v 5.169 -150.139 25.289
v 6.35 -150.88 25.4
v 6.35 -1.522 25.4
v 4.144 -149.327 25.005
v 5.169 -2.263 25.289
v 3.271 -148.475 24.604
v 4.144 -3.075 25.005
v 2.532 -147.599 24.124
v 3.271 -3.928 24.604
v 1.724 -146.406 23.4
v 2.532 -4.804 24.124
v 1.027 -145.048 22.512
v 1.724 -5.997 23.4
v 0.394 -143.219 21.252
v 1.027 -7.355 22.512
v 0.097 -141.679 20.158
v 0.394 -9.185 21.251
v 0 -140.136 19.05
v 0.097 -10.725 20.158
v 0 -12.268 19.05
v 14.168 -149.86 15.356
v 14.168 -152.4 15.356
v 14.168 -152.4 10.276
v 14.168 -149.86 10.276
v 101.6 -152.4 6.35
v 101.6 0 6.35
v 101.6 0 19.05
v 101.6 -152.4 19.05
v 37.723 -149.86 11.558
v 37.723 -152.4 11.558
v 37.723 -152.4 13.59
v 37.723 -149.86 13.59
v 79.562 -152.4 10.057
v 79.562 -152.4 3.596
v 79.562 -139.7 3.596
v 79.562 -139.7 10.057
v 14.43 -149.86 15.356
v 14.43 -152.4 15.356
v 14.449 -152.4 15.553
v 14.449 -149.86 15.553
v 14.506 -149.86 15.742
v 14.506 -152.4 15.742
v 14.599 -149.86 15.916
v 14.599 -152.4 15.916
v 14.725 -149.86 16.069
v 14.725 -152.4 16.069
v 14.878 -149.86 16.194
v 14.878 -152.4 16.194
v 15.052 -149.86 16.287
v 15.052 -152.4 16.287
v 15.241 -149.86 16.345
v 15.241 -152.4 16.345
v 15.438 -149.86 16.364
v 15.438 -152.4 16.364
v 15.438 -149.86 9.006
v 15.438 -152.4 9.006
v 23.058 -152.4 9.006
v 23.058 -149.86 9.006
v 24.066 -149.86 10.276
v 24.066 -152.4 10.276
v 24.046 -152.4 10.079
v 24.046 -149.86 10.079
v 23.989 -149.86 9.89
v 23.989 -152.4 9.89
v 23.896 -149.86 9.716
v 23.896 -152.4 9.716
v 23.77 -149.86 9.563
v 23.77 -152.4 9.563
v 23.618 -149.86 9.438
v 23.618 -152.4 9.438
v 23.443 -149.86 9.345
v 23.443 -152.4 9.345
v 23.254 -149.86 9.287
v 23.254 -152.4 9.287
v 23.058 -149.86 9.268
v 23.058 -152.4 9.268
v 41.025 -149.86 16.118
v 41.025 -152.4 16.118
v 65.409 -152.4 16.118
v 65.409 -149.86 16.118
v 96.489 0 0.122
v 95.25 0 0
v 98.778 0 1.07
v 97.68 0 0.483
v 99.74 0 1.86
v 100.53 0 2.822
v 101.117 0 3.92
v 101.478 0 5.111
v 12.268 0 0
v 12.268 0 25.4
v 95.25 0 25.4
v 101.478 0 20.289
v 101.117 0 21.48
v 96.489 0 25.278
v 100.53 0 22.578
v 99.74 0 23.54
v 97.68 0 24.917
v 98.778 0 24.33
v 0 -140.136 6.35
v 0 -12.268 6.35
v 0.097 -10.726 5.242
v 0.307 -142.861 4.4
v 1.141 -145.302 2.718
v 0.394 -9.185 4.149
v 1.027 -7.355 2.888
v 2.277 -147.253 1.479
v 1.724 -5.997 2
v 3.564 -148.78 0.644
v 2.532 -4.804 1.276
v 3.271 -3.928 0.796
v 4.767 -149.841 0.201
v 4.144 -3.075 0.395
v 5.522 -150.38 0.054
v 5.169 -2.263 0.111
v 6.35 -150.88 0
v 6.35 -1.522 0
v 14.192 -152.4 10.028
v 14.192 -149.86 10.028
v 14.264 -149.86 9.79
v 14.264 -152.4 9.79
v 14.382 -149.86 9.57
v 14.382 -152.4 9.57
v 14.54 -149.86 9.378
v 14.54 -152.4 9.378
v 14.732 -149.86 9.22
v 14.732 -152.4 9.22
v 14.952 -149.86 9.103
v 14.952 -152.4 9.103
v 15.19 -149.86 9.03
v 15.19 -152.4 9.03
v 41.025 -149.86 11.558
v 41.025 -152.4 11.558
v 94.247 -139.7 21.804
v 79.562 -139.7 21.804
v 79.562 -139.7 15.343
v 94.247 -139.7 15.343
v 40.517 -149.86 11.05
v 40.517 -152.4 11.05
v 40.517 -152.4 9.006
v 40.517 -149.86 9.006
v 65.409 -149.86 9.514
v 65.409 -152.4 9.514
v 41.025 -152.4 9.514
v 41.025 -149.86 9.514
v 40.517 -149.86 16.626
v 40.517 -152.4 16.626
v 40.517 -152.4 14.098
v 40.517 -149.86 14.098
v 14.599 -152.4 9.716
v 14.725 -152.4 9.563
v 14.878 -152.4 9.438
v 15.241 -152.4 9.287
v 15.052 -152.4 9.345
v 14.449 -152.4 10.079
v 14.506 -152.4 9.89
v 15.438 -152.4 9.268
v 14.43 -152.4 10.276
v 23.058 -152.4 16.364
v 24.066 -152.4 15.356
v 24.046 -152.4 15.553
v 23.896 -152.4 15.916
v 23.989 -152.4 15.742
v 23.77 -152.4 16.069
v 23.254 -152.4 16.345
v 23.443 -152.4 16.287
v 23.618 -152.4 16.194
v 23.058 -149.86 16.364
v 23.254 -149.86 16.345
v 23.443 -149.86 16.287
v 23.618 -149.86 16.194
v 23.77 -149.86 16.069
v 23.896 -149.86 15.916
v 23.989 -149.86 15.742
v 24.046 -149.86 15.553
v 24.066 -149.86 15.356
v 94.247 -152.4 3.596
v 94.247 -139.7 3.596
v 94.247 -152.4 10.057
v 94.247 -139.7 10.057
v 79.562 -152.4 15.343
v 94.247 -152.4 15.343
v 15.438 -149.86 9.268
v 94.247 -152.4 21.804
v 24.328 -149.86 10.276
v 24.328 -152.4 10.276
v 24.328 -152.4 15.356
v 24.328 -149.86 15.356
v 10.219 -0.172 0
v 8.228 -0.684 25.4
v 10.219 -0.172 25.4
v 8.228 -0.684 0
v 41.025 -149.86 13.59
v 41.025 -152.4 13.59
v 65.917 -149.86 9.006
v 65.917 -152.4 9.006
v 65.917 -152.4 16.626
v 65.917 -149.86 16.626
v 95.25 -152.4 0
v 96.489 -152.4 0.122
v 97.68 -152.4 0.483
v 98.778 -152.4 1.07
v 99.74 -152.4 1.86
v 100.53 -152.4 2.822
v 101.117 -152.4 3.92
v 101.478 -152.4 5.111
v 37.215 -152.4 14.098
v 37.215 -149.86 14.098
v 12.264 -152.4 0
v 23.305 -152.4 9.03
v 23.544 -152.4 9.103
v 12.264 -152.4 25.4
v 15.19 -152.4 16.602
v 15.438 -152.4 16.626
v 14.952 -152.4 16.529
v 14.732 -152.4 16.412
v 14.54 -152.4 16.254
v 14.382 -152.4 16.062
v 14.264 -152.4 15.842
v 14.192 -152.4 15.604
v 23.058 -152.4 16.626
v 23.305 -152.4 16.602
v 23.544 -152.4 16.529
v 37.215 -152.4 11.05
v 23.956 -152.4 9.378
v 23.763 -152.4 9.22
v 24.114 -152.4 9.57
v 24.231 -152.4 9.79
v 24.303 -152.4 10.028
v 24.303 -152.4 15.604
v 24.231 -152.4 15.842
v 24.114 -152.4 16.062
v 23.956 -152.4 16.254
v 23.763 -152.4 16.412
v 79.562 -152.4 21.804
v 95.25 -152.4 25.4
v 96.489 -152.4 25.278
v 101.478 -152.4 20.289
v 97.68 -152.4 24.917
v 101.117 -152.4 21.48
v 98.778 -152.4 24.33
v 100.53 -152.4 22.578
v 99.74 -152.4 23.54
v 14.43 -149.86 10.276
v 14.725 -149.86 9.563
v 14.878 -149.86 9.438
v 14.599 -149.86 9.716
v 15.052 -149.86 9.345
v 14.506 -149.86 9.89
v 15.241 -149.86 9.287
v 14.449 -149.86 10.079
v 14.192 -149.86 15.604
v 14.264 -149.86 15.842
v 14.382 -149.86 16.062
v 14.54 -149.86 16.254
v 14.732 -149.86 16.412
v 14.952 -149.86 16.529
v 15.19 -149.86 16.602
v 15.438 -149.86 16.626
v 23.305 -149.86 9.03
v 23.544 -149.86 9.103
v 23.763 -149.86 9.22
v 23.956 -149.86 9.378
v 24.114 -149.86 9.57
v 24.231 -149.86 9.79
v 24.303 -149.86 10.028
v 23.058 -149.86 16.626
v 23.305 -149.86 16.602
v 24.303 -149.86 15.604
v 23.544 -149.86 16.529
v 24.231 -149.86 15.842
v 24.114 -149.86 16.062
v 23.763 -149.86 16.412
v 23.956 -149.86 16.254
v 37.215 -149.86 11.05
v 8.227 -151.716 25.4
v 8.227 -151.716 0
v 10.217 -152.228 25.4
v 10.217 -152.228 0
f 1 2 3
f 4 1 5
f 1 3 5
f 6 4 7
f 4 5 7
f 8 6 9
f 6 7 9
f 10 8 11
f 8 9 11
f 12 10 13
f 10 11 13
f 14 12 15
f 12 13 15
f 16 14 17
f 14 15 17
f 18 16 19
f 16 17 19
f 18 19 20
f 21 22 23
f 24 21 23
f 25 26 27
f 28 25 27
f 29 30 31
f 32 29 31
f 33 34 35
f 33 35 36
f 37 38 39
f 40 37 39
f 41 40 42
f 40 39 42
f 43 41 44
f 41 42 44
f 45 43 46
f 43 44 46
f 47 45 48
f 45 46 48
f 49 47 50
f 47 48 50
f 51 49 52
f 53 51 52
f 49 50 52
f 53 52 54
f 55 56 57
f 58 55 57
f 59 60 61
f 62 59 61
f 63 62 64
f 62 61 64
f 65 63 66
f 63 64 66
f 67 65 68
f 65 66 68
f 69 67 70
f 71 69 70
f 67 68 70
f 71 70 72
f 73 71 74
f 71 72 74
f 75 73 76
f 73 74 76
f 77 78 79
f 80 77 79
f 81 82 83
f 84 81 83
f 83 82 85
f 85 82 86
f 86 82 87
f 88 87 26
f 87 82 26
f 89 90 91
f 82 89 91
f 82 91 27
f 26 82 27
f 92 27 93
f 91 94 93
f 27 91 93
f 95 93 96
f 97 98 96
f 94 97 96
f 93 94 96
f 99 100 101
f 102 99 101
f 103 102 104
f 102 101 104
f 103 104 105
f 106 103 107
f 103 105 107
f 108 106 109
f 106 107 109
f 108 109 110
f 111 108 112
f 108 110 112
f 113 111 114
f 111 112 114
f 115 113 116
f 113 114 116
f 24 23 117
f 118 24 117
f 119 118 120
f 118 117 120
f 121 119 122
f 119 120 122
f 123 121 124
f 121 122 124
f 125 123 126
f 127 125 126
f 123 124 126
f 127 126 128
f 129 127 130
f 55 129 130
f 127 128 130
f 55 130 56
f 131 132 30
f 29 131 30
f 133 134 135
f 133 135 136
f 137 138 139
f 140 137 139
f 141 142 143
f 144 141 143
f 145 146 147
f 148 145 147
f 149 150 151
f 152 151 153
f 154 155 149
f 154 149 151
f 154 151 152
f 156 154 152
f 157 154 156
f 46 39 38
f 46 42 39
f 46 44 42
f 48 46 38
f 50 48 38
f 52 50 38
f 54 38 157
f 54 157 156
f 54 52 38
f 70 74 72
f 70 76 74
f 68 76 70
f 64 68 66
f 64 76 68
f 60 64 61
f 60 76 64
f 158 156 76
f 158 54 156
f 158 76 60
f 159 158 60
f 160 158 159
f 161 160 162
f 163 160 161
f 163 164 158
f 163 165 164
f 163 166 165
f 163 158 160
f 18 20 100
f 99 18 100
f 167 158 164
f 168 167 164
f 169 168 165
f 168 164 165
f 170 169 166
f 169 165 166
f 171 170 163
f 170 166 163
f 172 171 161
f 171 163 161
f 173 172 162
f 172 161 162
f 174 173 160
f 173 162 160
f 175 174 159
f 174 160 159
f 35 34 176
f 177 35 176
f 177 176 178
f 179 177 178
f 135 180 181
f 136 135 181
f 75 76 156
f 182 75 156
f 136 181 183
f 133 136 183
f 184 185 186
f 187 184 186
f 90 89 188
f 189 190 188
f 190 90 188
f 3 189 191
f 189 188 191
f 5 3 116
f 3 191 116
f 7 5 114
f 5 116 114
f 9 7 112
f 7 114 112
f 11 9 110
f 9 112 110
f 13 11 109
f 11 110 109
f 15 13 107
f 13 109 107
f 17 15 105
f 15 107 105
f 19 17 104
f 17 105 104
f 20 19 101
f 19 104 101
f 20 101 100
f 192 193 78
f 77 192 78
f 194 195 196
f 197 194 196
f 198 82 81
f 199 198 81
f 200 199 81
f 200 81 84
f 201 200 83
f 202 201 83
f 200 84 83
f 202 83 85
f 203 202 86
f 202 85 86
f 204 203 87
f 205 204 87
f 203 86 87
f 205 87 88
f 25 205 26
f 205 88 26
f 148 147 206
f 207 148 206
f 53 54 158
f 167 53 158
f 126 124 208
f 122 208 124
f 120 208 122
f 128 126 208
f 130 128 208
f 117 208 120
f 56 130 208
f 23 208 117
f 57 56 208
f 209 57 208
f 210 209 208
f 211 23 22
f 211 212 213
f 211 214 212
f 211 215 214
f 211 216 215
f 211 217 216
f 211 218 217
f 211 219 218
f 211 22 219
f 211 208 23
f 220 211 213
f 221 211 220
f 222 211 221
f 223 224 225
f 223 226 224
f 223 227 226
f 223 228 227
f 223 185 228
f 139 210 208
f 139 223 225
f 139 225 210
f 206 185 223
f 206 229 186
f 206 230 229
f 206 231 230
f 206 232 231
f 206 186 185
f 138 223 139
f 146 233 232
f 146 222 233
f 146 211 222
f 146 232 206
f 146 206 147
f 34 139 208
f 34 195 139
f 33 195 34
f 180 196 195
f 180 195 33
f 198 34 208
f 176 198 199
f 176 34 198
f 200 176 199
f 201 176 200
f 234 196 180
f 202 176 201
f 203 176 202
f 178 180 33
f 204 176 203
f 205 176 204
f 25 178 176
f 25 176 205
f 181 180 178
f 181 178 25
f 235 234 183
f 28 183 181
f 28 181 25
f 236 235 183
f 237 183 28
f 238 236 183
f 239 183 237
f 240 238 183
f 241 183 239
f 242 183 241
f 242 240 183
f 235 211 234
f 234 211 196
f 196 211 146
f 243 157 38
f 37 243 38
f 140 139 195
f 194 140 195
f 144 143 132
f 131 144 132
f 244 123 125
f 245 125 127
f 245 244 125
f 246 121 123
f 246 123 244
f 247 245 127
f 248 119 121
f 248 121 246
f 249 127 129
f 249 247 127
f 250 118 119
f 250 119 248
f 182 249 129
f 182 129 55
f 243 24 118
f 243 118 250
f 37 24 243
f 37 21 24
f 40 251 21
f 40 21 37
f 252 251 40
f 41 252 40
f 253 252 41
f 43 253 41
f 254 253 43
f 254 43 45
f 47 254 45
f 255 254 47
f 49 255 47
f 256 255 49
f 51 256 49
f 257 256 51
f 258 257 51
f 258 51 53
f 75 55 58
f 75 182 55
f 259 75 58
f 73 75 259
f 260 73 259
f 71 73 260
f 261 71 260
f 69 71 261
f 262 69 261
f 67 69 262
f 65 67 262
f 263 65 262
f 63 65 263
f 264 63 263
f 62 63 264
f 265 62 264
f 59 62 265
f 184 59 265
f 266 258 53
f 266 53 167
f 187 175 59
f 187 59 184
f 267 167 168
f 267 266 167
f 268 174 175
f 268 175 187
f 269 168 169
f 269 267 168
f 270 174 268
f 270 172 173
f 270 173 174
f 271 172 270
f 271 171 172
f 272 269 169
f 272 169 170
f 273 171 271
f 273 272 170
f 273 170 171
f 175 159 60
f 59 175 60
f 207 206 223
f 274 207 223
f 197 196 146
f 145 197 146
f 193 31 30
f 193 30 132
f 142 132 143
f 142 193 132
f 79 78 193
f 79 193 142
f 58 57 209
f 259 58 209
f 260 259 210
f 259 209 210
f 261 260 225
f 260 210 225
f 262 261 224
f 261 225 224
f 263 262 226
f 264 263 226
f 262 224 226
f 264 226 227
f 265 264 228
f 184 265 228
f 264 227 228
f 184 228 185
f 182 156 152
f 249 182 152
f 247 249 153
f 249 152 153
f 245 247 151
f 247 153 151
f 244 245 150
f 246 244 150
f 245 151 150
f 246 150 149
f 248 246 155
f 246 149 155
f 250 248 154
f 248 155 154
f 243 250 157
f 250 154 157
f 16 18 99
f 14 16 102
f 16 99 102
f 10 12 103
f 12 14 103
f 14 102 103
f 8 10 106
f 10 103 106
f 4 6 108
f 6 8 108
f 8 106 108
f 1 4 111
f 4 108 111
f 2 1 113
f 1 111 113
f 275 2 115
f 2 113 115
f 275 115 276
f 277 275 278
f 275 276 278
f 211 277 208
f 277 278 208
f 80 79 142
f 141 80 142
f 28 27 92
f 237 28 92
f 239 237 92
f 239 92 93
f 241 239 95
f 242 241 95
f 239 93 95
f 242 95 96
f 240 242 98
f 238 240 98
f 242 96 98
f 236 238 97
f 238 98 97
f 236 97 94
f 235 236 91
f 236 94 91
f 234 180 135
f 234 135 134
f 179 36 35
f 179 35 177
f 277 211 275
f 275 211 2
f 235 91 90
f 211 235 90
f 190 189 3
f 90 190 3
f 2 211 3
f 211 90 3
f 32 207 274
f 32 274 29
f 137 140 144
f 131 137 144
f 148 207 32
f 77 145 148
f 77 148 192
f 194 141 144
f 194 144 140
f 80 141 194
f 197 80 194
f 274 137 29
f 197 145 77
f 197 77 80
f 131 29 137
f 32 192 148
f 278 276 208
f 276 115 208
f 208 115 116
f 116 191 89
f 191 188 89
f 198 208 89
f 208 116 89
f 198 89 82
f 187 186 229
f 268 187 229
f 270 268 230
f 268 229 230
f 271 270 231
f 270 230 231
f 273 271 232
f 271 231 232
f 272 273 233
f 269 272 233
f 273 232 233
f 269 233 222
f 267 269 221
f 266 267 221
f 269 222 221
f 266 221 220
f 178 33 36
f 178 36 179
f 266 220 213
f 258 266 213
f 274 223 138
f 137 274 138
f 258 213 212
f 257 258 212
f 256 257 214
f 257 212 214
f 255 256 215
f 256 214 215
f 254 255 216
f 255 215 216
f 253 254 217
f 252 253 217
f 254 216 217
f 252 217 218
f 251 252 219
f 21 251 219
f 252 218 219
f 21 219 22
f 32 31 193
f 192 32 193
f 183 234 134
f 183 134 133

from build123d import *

# Parameters (mm, degrees)
F1_DEPTH    = 152.4
F2_T1_DEPTH = 74.0210244843
F3_T1_DEPTH = 74.041
F4_W        = 14.6846622229
F4_H        = 6.4612496644
F5_DEPTH    = 12.7
F7_DEPTH    = 2.54
F9_DEPTH    = 2.54


# Not quite as in the source:
# - a fillet or chamfer that OpenCascade refuses, or shapes differently, is made with other operations: its cross-section is extruded or revolved along the edge and cut away or added


with BuildPart() as f1:
    # F0 (on Front) → F1 (new body)
    with BuildSketch(Plane.XZ):
        with BuildLine():
            Line((0, 19.05), (0, 6.35))
            ThreePointArc((0, 6.35), (1.8598719395, 1.8598719395), (6.35, 0))
            Line((6.35, 0), (95.25, 0))
            ThreePointArc((95.25, 0), (99.7401280605, 1.8598719395), (101.6, 6.35))
            Line((101.6, 6.35), (101.6, 19.05))
            ThreePointArc((101.6, 19.05), (99.7401280605, 23.5401280605), (95.25, 25.4))
            Line((95.25, 25.4), (6.35, 25.4))
            ThreePointArc((6.35, 25.4), (1.8598719395, 23.5401280605), (0, 19.05))
        make_face()
    extrude(amount=F1_DEPTH)

    # F2: fillet of radius 12.2642048969 on 1 edges, made by hand

    # F2_s2 → F2_t1 (cut)
    with BuildSketch(Plane.XY.offset(-24.3105122421)):
        with BuildLine():
            ThreePointArc((0, -140.1357951031), (3.5921024484, -148.8078975516), (12.2642048969, -152.4))
            Line((12.2642048969, -152.4), (0, -152.4))
            Line((0, -152.4), (0, -140.1357951031))
        make_face()
    extrude(amount=F2_T1_DEPTH, mode=Mode.SUBTRACT)

    # F3: fillet of radius 12.2682 on 1 edges, made by hand

    # F3_s2 → F3_t1 (cut)
    with BuildSketch(Plane.XY.offset(-24.3205)):
        with BuildLine():
            ThreePointArc((12.2682, 0), (3.593272587, -3.593272587), (0, -12.2682))
            Line((0, -12.2682), (0, 0))
            Line((0, 0), (12.2682, 0))
        make_face()
    extrude(amount=F3_T1_DEPTH, mode=Mode.SUBTRACT)

    # F4 (on face) → F5 (cut)
    with BuildSketch(Plane.XZ.offset(152.4)):
        with Locations((86.9044545794, 18.573864289)):
            Rectangle(F4_W, F4_H)
        with Locations((86.904451251, 6.8261355627)):
            Rectangle(F4_W, F4_H)
    extrude(amount=-F5_DEPTH, mode=Mode.SUBTRACT)

    # F6 (on face) → F7 (cut)
    with BuildSketch(Plane.XZ.offset(152.4)):
        Polygon((40.5169758041, 14.0975351255), (37.2149758041, 14.0975351255), (37.2149758041, 11.0495351255), (40.5169758041, 11.0495351255), (40.5169758041, 9.0060108787), (65.9169758041, 9.0060108787), (65.9169758041, 16.6260108787), (40.5169758041, 16.6260108787), align=None)
        Polygon((65.4089756118, 16.1180106864), (65.4089756118, 9.514011071), (41.0249759964, 9.514011071), (41.0249759964, 11.5575353178), (37.7229759964, 11.5575353178), (37.7229759964, 13.5895349332), (41.0249759964, 13.5895349332), (41.0249759964, 16.1180106864), align=None, mode=Mode.SUBTRACT)
    extrude(amount=-F7_DEPTH, mode=Mode.SUBTRACT)

    # F8 (on face) → F9 (cut)
    with BuildSketch(Plane.XZ.offset(152.4)):
        with BuildLine():
            Line((23.0576487401, 16.6260112998), (15.4376487401, 16.6260112998))
            ThreePointArc((15.4376487401, 16.6260112998), (14.539623128, 16.2540369119), (14.1676487401, 15.3560112998))
            Line((14.1676487401, 15.3560112998), (14.1676487401, 10.2760112998))
            ThreePointArc((14.1676487401, 10.2760112998), (14.539623128, 9.3779856877), (15.4376487401, 9.0060112998))
            Line((15.4376487401, 9.0060112998), (23.0576487401, 9.0060112998))
            ThreePointArc((23.0576487401, 9.0060112998), (23.9556743522, 9.3779856877), (24.3276487401, 10.2760112998))
            Line((24.3276487401, 10.2760112998), (24.3276487401, 15.3560112998))
            ThreePointArc((24.3276487401, 15.3560112998), (23.9556743522, 16.2540369119), (23.0576487401, 16.6260112998))
        make_face()
        with BuildLine():
            ThreePointArc((14.4295694742, 15.3560112998), (14.7248290552, 16.0688309847), (15.4376487401, 16.3640905657))
            Line((15.4376487401, 16.3640905657), (23.0576487401, 16.3640905657))
            ThreePointArc((23.0576487401, 16.3640905657), (23.770468425, 16.0688309847), (24.0657280061, 15.3560112998))
            Line((24.0657280061, 15.3560112998), (24.0657280061, 10.2760112998))
            ThreePointArc((24.0657280061, 10.2760112998), (23.770468425, 9.5631916149), (23.0576487401, 9.2679320338))
            Line((23.0576487401, 9.2679320338), (15.4376487401, 9.2679320338))
            ThreePointArc((15.4376487401, 9.2679320338), (14.7248290552, 9.5631916149), (14.4295694742, 10.2760112998))
            Line((14.4295694742, 10.2760112998), (14.4295694742, 15.3560112998))
        make_face(mode=Mode.SUBTRACT)
    extrude(amount=-F9_DEPTH, mode=Mode.SUBTRACT)


solid = f1.part
